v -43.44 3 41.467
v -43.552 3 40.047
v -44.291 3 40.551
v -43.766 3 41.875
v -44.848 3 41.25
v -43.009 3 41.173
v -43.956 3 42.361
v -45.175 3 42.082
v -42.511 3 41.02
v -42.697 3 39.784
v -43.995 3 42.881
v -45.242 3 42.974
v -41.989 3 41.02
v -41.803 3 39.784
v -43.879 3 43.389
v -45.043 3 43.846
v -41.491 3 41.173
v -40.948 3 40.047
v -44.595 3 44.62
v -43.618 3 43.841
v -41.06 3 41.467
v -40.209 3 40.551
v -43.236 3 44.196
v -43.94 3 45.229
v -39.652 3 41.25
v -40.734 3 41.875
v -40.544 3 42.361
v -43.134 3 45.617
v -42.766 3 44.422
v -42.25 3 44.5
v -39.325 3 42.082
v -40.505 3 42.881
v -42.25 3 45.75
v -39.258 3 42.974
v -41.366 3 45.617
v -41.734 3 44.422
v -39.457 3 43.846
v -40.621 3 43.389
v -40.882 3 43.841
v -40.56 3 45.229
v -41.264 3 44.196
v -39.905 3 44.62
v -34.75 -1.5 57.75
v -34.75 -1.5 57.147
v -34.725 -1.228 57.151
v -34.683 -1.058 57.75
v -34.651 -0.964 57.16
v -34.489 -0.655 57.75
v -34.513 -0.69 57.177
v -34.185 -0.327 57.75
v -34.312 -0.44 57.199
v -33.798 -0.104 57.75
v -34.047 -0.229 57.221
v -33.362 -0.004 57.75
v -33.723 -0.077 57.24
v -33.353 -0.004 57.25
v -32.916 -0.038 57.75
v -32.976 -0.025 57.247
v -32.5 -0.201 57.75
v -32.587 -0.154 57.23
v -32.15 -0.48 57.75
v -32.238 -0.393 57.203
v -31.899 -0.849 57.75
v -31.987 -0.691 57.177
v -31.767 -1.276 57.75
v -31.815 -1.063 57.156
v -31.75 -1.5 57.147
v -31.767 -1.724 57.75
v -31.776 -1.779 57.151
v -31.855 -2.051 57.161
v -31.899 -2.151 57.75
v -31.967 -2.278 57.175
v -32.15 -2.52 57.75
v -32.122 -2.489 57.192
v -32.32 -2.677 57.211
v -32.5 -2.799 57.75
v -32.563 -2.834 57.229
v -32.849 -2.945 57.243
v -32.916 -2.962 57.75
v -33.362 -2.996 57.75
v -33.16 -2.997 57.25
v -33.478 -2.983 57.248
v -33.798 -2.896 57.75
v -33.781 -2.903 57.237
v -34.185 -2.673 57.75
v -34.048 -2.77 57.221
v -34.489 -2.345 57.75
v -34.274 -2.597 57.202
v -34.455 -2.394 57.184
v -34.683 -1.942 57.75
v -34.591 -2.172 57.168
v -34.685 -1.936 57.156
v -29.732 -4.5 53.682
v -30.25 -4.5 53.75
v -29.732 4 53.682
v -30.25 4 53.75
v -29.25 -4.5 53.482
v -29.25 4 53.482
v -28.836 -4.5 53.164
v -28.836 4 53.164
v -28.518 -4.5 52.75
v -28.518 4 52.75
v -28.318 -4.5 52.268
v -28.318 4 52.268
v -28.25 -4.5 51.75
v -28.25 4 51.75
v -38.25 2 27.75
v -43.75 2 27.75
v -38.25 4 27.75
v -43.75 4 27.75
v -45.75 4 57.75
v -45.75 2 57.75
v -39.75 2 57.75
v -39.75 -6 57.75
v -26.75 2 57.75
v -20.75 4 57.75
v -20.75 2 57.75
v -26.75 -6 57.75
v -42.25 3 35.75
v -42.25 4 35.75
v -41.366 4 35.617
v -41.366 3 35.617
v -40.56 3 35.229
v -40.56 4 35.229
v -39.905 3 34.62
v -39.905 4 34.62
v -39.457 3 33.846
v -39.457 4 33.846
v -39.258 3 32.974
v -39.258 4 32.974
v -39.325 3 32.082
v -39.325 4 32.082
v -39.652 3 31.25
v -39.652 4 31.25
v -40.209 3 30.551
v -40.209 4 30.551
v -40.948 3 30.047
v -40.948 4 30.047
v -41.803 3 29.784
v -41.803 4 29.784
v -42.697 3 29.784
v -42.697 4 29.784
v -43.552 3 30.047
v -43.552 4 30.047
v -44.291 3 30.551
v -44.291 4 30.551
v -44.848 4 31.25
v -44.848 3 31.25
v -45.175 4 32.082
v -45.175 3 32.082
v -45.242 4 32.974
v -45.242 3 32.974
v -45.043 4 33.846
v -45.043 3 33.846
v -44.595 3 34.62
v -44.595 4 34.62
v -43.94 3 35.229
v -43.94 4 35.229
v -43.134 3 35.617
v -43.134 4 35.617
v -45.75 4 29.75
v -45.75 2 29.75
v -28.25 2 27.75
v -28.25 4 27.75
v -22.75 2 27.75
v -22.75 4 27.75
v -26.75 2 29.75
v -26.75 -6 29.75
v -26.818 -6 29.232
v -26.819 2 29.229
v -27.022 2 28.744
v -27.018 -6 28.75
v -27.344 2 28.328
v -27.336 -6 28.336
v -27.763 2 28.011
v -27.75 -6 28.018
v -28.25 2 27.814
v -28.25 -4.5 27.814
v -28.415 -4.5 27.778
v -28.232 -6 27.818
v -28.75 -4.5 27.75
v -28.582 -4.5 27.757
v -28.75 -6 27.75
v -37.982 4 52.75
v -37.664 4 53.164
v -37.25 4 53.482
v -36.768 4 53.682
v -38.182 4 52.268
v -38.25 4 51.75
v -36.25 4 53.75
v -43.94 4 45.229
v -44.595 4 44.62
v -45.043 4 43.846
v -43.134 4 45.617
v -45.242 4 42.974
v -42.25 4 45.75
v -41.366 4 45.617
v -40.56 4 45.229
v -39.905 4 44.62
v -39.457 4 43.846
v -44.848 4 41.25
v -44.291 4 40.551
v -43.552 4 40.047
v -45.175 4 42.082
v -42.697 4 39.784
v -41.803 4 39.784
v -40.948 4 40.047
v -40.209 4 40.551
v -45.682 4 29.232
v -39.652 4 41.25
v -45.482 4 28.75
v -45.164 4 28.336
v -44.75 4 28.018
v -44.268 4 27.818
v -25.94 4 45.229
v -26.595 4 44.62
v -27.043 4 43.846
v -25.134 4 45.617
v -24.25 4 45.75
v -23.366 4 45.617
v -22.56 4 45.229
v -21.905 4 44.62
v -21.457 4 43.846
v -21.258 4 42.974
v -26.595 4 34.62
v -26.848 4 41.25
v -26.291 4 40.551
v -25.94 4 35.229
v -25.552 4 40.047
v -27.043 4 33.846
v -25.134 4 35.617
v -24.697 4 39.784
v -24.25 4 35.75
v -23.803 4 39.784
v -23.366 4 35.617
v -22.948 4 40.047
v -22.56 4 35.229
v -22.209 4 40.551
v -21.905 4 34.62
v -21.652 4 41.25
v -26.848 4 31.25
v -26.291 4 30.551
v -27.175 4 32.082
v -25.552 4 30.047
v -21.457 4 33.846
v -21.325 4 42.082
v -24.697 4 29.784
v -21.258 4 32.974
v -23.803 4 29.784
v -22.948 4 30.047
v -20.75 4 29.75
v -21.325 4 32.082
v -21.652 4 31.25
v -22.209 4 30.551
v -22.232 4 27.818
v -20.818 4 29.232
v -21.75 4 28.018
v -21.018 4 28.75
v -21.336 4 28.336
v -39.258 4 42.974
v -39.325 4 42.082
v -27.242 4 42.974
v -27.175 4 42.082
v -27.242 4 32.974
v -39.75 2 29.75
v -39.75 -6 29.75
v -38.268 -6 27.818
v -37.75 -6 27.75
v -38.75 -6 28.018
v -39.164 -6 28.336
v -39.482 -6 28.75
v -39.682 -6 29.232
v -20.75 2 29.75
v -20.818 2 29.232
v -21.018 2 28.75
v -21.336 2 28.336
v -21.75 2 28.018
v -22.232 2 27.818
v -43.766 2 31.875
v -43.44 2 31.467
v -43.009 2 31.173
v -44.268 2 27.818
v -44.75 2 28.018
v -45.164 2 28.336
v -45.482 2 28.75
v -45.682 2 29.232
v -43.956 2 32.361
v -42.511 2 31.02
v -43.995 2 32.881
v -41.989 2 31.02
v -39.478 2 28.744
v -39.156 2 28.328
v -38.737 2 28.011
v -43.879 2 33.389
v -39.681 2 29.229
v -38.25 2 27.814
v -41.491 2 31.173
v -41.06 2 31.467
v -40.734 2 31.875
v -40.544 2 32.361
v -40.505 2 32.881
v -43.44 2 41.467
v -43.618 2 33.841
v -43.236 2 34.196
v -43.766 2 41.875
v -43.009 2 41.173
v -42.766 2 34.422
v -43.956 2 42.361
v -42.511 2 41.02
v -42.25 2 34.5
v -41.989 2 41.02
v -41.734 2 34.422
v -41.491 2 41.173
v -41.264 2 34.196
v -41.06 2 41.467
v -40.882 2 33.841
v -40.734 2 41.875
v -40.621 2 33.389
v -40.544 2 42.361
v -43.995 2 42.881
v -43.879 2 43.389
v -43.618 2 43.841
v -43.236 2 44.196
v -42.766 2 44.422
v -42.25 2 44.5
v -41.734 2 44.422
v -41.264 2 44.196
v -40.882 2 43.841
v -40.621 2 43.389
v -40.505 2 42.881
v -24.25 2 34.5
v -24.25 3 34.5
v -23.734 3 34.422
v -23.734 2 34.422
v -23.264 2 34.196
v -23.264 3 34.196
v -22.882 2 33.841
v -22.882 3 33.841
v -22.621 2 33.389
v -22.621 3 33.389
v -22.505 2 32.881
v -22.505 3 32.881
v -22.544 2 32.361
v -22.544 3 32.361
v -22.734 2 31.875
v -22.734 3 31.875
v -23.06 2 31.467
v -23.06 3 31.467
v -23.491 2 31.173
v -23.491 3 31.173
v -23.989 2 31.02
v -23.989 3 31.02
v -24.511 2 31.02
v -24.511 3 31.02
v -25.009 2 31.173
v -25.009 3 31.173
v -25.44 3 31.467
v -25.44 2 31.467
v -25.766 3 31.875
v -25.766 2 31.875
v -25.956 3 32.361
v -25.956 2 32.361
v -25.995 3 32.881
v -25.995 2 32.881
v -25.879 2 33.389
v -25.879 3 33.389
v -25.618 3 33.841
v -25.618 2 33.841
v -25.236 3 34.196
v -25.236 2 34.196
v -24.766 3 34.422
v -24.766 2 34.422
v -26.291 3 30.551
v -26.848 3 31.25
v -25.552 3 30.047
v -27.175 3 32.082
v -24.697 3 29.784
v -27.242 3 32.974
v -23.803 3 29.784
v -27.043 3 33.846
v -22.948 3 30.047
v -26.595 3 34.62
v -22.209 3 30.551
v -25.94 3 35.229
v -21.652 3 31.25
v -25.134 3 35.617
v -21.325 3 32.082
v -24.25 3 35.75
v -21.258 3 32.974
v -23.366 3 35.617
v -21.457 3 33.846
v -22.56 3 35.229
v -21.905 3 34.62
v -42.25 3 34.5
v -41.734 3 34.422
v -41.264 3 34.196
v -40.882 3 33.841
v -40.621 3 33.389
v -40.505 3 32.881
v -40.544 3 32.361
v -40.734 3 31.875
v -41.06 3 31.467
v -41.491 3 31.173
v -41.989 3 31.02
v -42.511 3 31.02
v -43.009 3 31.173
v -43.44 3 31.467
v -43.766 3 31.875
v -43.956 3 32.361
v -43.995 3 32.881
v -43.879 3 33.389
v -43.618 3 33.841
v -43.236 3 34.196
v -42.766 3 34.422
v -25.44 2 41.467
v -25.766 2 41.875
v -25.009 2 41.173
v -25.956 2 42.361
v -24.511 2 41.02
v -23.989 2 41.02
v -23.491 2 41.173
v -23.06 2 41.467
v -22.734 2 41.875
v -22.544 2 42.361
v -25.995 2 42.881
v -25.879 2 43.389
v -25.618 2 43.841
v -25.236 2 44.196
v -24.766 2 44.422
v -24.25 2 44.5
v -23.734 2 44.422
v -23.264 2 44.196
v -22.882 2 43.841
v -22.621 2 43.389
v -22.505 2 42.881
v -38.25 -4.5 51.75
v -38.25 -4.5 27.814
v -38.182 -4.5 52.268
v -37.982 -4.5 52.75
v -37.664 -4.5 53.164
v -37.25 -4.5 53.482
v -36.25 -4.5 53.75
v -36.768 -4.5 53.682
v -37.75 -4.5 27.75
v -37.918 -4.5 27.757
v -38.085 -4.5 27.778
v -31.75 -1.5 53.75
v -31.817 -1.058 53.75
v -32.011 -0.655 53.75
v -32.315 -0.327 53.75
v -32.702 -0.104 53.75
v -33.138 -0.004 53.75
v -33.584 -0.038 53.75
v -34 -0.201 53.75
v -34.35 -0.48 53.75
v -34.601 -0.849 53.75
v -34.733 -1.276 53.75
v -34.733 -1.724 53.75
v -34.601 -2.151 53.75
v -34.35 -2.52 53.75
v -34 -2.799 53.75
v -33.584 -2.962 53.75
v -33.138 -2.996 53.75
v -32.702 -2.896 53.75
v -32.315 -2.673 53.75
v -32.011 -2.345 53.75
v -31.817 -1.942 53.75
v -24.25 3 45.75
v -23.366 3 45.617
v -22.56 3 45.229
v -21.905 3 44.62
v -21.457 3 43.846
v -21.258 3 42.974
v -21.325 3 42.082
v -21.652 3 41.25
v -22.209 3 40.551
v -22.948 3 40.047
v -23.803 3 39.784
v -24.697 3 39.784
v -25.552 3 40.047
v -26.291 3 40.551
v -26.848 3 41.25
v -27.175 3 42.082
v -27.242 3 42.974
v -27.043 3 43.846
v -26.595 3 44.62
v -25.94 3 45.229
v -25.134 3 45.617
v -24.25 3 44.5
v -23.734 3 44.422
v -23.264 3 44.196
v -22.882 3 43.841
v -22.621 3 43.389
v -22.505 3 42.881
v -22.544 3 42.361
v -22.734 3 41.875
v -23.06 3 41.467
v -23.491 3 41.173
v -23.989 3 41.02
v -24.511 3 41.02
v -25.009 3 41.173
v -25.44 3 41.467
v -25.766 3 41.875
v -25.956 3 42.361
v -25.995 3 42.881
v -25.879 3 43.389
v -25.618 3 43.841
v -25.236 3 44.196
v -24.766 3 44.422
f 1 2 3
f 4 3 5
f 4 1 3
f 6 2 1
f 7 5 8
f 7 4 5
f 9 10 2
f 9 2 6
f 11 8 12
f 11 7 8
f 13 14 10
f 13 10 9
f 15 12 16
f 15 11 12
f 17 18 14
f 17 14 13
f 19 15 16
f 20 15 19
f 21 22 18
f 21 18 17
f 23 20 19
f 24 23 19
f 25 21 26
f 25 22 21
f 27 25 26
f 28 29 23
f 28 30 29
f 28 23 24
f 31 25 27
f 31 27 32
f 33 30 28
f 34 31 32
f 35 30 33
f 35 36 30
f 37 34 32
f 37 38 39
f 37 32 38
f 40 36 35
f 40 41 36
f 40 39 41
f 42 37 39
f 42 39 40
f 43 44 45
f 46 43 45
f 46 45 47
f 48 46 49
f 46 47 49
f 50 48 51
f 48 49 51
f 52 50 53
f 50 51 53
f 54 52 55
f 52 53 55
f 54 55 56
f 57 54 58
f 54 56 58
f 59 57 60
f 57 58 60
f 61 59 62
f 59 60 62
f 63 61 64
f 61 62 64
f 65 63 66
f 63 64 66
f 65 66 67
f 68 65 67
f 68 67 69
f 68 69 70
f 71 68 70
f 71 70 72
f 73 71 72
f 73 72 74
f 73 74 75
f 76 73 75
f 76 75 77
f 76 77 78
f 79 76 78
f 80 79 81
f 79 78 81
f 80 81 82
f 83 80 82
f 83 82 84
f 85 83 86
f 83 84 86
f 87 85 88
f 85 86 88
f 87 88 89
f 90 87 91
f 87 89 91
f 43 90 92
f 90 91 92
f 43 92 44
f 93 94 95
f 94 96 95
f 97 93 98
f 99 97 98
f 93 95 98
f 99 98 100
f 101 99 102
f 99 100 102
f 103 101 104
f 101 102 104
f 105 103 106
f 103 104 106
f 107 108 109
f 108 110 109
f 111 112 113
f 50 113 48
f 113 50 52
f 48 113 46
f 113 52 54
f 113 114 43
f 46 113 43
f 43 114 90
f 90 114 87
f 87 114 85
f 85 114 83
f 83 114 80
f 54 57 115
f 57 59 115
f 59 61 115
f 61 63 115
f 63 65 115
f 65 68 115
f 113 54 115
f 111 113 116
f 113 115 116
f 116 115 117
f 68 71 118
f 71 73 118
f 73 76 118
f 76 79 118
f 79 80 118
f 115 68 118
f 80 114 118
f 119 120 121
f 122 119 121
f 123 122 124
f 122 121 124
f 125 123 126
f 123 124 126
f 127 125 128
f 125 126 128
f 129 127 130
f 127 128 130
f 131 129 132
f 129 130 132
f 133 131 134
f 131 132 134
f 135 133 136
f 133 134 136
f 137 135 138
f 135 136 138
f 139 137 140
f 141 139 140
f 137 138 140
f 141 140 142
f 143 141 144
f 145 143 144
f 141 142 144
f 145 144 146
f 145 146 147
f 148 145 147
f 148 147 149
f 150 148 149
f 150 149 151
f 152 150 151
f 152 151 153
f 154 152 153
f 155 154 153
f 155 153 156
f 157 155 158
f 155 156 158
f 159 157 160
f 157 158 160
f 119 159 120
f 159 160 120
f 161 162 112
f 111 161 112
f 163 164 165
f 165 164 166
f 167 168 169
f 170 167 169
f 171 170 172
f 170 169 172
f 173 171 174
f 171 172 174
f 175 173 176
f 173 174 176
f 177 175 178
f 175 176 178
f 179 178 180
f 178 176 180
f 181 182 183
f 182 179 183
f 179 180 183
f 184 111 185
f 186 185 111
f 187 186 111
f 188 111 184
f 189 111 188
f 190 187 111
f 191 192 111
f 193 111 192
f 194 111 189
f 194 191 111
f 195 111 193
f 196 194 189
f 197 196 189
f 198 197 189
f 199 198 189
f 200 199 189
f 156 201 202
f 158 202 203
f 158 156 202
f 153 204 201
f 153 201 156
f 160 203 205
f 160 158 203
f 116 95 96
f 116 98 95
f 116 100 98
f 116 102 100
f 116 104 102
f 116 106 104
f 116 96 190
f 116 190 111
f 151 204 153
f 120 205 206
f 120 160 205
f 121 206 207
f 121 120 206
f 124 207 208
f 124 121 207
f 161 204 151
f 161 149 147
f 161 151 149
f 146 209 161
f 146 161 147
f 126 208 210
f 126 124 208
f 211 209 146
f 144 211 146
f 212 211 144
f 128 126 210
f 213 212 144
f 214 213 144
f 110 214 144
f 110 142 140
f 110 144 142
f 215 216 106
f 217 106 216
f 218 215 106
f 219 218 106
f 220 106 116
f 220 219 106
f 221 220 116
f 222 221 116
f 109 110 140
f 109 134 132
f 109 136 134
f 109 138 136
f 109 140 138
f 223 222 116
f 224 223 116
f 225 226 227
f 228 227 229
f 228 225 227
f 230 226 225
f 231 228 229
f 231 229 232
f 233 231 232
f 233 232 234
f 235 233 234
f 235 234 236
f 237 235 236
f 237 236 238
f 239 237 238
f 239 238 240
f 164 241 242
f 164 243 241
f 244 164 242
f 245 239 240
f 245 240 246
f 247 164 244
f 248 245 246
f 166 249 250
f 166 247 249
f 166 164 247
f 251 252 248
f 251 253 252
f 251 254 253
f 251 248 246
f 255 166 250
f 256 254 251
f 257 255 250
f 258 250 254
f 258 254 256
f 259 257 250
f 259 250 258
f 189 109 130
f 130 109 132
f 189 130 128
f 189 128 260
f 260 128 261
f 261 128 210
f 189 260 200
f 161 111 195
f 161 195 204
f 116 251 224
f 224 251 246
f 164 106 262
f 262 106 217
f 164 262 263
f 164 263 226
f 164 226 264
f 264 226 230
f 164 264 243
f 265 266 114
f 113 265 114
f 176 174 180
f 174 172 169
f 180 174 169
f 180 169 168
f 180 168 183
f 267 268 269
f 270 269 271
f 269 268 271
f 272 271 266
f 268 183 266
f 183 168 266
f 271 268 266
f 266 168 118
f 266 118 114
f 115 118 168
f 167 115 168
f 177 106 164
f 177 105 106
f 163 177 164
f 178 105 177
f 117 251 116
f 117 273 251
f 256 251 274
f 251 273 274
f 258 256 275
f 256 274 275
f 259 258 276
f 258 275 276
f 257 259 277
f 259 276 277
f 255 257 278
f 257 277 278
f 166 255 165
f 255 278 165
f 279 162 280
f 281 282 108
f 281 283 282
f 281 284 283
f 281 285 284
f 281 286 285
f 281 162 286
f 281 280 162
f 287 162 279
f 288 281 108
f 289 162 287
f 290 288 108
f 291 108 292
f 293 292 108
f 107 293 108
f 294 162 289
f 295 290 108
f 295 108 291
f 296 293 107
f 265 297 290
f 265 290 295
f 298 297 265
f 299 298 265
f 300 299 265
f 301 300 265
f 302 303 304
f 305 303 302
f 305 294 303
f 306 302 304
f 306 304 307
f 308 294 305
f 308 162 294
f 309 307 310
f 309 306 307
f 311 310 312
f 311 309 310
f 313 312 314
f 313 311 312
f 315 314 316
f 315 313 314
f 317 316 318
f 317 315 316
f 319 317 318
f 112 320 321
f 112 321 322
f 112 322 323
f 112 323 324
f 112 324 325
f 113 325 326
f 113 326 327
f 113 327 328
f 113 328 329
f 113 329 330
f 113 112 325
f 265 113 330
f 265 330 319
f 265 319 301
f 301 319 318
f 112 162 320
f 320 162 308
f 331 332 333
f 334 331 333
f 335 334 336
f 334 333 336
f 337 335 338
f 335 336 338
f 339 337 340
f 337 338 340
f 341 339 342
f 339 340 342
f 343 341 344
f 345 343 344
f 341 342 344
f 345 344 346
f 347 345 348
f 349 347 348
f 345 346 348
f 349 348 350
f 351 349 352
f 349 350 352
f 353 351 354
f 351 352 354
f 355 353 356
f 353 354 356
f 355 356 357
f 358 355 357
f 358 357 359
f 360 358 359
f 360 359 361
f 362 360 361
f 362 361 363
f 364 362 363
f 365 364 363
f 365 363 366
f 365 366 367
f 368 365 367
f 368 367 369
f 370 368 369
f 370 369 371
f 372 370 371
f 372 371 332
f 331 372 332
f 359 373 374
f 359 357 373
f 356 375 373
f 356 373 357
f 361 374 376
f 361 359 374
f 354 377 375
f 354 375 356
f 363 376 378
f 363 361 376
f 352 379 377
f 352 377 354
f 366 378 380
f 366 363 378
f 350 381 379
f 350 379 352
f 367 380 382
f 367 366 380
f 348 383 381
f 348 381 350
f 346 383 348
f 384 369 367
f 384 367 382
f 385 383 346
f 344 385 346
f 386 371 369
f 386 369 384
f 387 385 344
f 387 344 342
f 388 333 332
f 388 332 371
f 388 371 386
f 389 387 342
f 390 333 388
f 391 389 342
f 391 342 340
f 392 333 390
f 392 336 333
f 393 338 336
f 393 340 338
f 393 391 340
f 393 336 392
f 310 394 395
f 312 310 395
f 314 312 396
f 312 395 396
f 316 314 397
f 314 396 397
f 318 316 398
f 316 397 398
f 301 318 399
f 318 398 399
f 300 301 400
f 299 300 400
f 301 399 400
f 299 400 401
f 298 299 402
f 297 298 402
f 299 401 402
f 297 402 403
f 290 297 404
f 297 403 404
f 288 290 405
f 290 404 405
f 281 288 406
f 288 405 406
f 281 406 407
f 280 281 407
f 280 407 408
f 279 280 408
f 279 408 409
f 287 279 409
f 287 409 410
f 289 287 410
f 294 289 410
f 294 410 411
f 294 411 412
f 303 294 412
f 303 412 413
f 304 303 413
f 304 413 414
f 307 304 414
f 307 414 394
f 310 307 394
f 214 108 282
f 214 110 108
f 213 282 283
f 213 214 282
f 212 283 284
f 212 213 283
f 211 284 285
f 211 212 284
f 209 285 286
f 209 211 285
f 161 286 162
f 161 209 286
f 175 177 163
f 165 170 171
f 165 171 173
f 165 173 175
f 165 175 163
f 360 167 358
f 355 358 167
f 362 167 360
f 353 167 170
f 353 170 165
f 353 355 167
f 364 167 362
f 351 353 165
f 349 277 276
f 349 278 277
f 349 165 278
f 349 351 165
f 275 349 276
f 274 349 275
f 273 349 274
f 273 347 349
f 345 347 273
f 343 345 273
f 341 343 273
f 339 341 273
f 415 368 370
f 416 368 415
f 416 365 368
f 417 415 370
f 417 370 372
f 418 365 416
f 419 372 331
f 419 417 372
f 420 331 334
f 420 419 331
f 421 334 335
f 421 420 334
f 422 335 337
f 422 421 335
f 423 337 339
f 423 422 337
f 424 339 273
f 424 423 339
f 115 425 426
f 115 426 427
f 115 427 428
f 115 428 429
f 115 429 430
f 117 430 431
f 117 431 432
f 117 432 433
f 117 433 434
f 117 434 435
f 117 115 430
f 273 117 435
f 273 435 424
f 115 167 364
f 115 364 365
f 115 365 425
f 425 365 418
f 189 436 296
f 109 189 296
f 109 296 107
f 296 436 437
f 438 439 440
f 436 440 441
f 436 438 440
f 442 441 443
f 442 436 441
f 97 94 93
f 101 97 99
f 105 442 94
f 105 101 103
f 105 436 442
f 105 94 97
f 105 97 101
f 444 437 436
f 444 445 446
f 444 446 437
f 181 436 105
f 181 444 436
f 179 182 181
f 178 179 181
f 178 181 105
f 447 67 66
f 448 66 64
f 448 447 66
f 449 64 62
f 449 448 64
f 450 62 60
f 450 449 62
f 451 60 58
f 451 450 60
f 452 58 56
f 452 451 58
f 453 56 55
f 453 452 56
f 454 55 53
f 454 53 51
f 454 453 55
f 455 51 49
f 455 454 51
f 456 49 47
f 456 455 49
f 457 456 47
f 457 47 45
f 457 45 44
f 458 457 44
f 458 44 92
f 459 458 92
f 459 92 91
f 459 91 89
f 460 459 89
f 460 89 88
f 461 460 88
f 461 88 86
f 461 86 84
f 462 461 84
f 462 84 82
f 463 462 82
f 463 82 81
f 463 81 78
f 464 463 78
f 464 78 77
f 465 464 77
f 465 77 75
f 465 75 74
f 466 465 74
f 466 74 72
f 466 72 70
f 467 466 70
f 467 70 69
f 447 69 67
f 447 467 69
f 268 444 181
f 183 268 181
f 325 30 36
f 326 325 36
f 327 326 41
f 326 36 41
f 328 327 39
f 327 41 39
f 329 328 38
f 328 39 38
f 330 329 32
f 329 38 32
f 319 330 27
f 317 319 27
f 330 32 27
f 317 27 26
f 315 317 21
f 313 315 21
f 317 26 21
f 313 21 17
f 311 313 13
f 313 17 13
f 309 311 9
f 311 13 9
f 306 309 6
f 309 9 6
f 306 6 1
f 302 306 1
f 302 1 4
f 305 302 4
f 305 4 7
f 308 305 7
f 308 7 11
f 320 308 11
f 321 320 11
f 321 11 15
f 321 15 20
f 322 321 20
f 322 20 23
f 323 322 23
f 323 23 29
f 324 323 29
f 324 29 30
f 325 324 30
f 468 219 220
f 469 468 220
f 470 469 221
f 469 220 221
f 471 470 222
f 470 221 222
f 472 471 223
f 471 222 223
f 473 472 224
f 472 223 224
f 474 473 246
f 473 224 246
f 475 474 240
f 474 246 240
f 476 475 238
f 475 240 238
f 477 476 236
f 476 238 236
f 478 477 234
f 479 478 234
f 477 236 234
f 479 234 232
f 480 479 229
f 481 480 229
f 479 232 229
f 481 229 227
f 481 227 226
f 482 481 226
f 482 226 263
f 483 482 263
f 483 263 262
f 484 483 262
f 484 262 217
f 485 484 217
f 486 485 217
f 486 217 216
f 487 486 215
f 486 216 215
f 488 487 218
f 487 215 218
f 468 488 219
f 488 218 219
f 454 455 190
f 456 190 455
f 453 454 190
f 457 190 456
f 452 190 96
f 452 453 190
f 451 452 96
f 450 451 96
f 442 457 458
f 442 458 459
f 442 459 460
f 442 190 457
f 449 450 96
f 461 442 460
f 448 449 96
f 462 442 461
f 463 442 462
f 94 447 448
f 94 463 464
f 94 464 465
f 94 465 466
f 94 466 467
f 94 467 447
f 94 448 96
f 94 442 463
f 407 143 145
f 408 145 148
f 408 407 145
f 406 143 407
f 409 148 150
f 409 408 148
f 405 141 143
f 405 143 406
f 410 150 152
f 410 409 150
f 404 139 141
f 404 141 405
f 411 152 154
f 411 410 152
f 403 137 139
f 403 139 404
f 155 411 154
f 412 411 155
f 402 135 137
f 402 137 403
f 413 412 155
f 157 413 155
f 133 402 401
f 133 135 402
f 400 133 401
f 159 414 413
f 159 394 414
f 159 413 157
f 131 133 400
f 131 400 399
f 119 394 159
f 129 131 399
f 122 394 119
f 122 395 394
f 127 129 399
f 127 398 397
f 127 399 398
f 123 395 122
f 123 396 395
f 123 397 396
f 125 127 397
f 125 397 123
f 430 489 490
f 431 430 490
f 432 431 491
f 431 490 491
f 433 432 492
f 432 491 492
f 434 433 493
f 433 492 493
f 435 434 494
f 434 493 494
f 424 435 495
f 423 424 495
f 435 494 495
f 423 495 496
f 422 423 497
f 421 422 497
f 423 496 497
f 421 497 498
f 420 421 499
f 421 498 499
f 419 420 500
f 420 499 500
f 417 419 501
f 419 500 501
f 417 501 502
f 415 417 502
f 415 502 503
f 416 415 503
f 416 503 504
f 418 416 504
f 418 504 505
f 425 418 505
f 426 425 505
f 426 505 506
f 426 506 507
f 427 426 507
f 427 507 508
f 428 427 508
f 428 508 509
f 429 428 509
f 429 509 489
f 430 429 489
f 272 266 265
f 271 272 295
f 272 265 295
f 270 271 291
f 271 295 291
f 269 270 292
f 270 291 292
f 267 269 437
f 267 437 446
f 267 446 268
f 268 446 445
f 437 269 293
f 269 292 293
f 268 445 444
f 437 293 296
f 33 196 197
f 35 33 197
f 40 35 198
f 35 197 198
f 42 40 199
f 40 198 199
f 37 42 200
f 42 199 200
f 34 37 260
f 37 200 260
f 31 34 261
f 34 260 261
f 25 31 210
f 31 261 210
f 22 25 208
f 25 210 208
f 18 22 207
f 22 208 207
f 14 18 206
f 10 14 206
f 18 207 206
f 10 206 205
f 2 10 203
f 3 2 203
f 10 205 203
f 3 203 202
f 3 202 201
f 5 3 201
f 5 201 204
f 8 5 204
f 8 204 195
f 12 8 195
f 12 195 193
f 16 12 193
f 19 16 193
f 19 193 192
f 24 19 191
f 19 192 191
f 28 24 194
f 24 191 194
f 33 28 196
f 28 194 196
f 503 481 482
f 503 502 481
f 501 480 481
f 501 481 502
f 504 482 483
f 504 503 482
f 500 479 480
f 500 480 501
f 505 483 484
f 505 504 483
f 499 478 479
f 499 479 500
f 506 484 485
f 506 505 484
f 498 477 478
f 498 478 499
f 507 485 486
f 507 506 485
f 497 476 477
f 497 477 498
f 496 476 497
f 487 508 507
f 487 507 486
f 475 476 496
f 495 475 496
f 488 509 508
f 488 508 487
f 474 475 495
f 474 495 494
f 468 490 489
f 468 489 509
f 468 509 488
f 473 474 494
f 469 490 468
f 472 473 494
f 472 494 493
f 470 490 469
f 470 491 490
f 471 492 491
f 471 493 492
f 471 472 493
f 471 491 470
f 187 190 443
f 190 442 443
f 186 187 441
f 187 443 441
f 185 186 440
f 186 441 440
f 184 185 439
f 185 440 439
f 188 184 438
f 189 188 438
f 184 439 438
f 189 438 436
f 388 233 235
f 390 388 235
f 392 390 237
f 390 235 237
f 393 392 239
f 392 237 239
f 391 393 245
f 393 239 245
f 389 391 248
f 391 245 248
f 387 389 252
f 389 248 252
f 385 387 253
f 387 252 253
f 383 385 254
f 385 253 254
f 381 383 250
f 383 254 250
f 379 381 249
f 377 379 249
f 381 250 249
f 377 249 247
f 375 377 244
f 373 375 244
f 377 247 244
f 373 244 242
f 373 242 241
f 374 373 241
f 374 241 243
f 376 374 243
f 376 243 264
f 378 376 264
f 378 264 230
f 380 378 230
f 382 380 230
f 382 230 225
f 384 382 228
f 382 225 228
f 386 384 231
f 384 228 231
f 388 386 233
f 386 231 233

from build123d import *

# Parameters (mm, degrees)
SKETCH_1_W           = 35
SKETCH_1_H           = 55
EXTRUDE_1_DEPTH      = 1
EXTRUDE_2_DEPTH      = 3
SKETCH_3_R           = 5
CUT_EXTRUDE_1_DEPTH  = 169.569903897
SKETCH_4_R           = 4
CUT_EXTRUDE_2_DEPTH  = 2
SKETCH_5_R           = 2
CUT_EXTRUDE_3_DEPTH  = 2
EXTRUDE_START        = 7
EXTRUDE_3_DEPTH      = 7
CUT_EXTRUDE_START    = -1.5
SKETCH_9_W           = 10
SKETCH_9_H           = 26
CUT_EXTRUDE_4_DEPTH  = 168.318874833
SKETCH_10_R          = 1.5
CUT_EXTRUDE_5_DEPTH  = 194.595583627
SKETCH_11_W          = 338.377402865
SKETCH_11_H          = 318.232792562
CUT_EXTRUDE_6_DEPTH  = 10
SKETCH_12_W          = 33.023791835
SKETCH_12_H          = 7.5
CUT_EXTRUDE_7_DEPTH  = 74.963673636
CUT_EXTRUDE_START_2  = 9
CUT_EXTRUDE_8_DEPTH  = 10
EXTRUDE_START_2      = -2
EXTRUDE_4_DEPTH      = 2
EXTRUDE_5_DEPTH      = 8
SKETCH_16_R          = 1.5
CUT_EXTRUDE_9_DEPTH  = 53.962840747
SKETCH_17_R          = 1.75
CUT_EXTRUDE_10_DEPTH = 10
SKETCH_18_R          = 3
CUT_EXTRUDE_11_DEPTH = 1
FILLET_1_R           = 2
FILLET_2_R           = 2
FILLET_3_R           = 2
FILLET_4_R           = 2


with BuildPart() as part:
    # 草图1 → 凸台-拉伸1 (new body)
    with BuildSketch(Plane(origin=(0, 0, 0), x_dir=(1, 0, 0), z_dir=(0, 1, 0))):
        Rectangle(SKETCH_1_W, SKETCH_1_H)
    extrude(amount=EXTRUDE_1_DEPTH)

    # 草图2 → 凸台-拉伸2 (add)
    with BuildSketch(Plane(origin=(0, 1, 0), x_dir=(1, 0, 0), z_dir=(0, 1, 0))):
        with BuildLine():
            Line((106.75, -2.25), (106.75, 2.25))
            Line((106.75, 2.25), (121.75, 2.25))
            ThreePointArc((121.75, 2.25), (122.922125199, 2.352547667), (124.058635967, 2.65707481))
            Line((124.058635967, 2.65707481), (154.058635967, 13.576181838))
            ThreePointArc((154.058635967, 13.576181838), (158.397452333, 21.091232227), (151.75, 26.669107028))
            Line((151.75, 26.669107028), (-31.447415548, 57.101298968))
            ThreePointArc((-31.447415548, 57.101298968), (-37.800418235, 56.264673928), (-42.609265279, 52.029632639))
            Line((-42.609265279, 52.029632639), (-60.161792173, 23.605896086))
            ThreePointArc((-60.161792173, 23.605896086), (-61.717833724, 20.073278016), (-62.25, 16.25))
            Line((-62.25, 16.25), (-62.25, -16.25))
            ThreePointArc((-62.25, -16.25), (-61.717833724, -20.073278016), (-60.161792173, -23.605896086))
            Line((-60.161792173, -23.605896086), (-42.609265279, -52.029632639))
            ThreePointArc((-42.609265279, -52.029632639), (-37.800418235, -56.264673928), (-31.447415548, -57.101298968))
            Line((-31.447415548, -57.101298968), (151.75, -26.669107028))
            ThreePointArc((151.75, -26.669107028), (158.397452333, -21.091232227), (154.058635967, -13.576181838))
            Line((154.058635967, -13.576181838), (124.058635967, -2.65707481))
            ThreePointArc((124.058635967, -2.65707481), (122.922125199, -2.352547667), (121.75, -2.25))
            Line((121.75, -2.25), (106.75, -2.25))
        make_face()
    extrude(amount=EXTRUDE_2_DEPTH)

    # 草图3 → 切除-拉伸1 (cut, through all)
    with BuildSketch(Plane(origin=(0, 4, 0), x_dir=(1, 0, 0), z_dir=(0, 1, 0))):
        with Locations(Location((-48.25, 16.25, 0), (0, 0, 270))):
            Circle(SKETCH_3_R)
        with Locations(Location((-48.25, -16.25, 0), (0, 0, 270))):
            Circle(SKETCH_3_R)
    extrude(amount=-CUT_EXTRUDE_1_DEPTH, mode=Mode.SUBTRACT)

    # 草图4 → 切除-拉伸2 (cut)
    with BuildSketch(Plane(origin=(0, 4, 0), x_dir=(1, 0, 0), z_dir=(0, 1, 0))):
        with Locations(Location((-33.25, 46.25, 0), (0, 0, 270))):
            Circle(SKETCH_4_R)
        with Locations(Location((-33.25, -46.25, 0), (0, 0, 270))):
            Circle(SKETCH_4_R)
    extrude(amount=-CUT_EXTRUDE_2_DEPTH, mode=Mode.SUBTRACT)

    # 草图5 → 切除-拉伸3 (cut)
    with BuildSketch(Plane(origin=(0, 4, 0), x_dir=(1, 0, 0), z_dir=(0, 1, 0))):
        with Locations(Location((121.75, 9, 0), (0, 0, 270))):
            Circle(SKETCH_5_R)
        with Locations(Location((121.75, -9, 0), (0, 0, 270))):
            Circle(SKETCH_5_R)
        with Locations(Location((151.75, 19.919107028, 0), (0, 0, 270))):
            Circle(SKETCH_5_R)
        with Locations(Location((151.75, -19.919107028, 0), (0, 0, 270))):
            Circle(SKETCH_5_R)
    extrude(amount=-CUT_EXTRUDE_3_DEPTH, mode=Mode.SUBTRACT)

    # 草图8 → 凸台-拉伸3 (add)
    with BuildSketch(Plane.XZ.offset(-1).offset(EXTRUDE_START)):
        with BuildLine():
            Line((-26.75, -26.25), (-39.75, -26.25))
            Line((-39.75, -26.25), (-39.75, -55.124119675))
            ThreePointArc((-39.75, -55.124119675), (-35.798281322, -56.950759894), (-31.447415548, -57.101298968))
            Line((-31.447415548, -57.101298968), (-26.75, -56.320978726))
            Line((-26.75, -56.320978726), (-26.75, -26.25))
        make_face()
    extrude_3 = extrude(amount=-EXTRUDE_3_DEPTH)

    # 镜向1: 凸台-拉伸3 across plane
    add(extrude_3.mirror(Plane.XY))

    # 草图9 → 切除-拉伸4 (cut, through all)
    with BuildSketch(Plane.XZ.offset(6).offset(CUT_EXTRUDE_START)):
        with Locations((-33.25, -40.75)):
            Rectangle(SKETCH_9_W, SKETCH_9_H)
    cut_extrude_4 = extrude(amount=-CUT_EXTRUDE_4_DEPTH, mode=Mode.SUBTRACT)

    # 镜向2: 切除-拉伸4 across plane
    add(cut_extrude_4.mirror(Plane.XY), mode=Mode.SUBTRACT)

    # 草图10 → 切除-拉伸5 (cut, through all)
    with BuildSketch(Plane.XY.offset(-53.75)):
        with Locations((-33.25, -1.5)):
            Circle(SKETCH_10_R)
    cut_extrude_5 = extrude(amount=-CUT_EXTRUDE_5_DEPTH, mode=Mode.SUBTRACT)

    # 镜向3: 切除-拉伸5 across plane
    add(cut_extrude_5.mirror(Plane.XY), mode=Mode.SUBTRACT)

    # 草图11 → 切除-拉伸6 (cut)
    with BuildSketch(Plane.XZ.offset(6)):
        with Locations((33.683140033, 0)):
            Rectangle(SKETCH_11_W, SKETCH_11_H)
        with BuildLine():
            ThreePointArc((-30.464187664, 63.020189314), (-38.770685795, 62.328620225), (-45.75, 57.771718622))
            Line((-45.75, 57.771718622), (-45.75, 20.25))
            Line((-45.75, 20.25), (-20.75, 20.25))
            Line((-20.75, 20.25), (-20.75, 61.406498299))
            Line((-20.75, 61.406498299), (-30.464187664, 63.020189314))
        make_face(mode=Mode.SUBTRACT)
    extrude(amount=-CUT_EXTRUDE_6_DEPTH, mode=Mode.SUBTRACT)

    # 草图12 → 切除-拉伸7 (cut, through all)
    with BuildSketch(Plane(origin=(0, 4, 0), x_dir=(1, 0, 0), z_dir=(0, 1, 0))):
        with Locations((-37.261895917, -24)):
            Rectangle(SKETCH_12_W, SKETCH_12_H)
    extrude(amount=-CUT_EXTRUDE_7_DEPTH, mode=Mode.SUBTRACT)

    # 草图13 → 切除-拉伸8 (cut)
    with BuildSketch(Plane.XZ.offset(-1).offset(CUT_EXTRUDE_START_2)):
        Polygon((-26.75, 56.320978726), (-26.75, 27.75), (-20.75, 27.75), (-20.75, 55.324277157), align=None)
        with BuildLine():
            Line((-45.75, 46.943674541), (-45.75, 27.75))
            Line((-45.75, 27.75), (-39.75, 27.75))
            Line((-39.75, 27.75), (-39.75, 55.124119675))
            ThreePointArc((-39.75, 55.124119675), (-41.329172996, 53.715049478), (-42.609265279, 52.029632639))
            Line((-42.609265279, 52.029632639), (-45.75, 46.943674541))
        make_face()
    extrude(amount=-CUT_EXTRUDE_8_DEPTH, mode=Mode.SUBTRACT)

    # 草图14 → 凸台-拉伸4 (add)
    with BuildSketch(Plane(origin=(0, 4, 0), x_dir=(1, 0, 0), z_dir=(0, 1, 0)).offset(EXTRUDE_START_2)):
        with BuildLine():
            Line((-38.25, -53.75), (-38.25, -27.75))
            Line((-38.25, -27.75), (-45.75, -27.75))
            Line((-45.75, -27.75), (-45.75, -46.943674541))
            Line((-45.75, -46.943674541), (-42.609265279, -52.029632639))
            ThreePointArc((-42.609265279, -52.029632639), (-37.800418235, -56.264673928), (-31.447415548, -57.101298968))
            Line((-31.447415548, -57.101298968), (-20.75, -55.324277157))
            Line((-20.75, -55.324277157), (-20.75, -27.75))
            Line((-20.75, -27.75), (-28.25, -27.75))
            Line((-28.25, -27.75), (-28.25, -53.75))
            Line((-28.25, -53.75), (-38.25, -53.75))
        make_face()
        with BuildLine():
            Line((-20.75, -57.75), (-20.75, -55.324277157))
            Line((-20.75, -55.324277157), (-31.447415548, -57.101298968))
            ThreePointArc((-31.447415548, -57.101298968), (-37.800418235, -56.264673928), (-42.609265279, -52.029632639))
            Line((-42.609265279, -52.029632639), (-45.75, -46.943674541))
            Line((-45.75, -46.943674541), (-45.75, -57.75))
            Line((-45.75, -57.75), (-20.75, -57.75))
        make_face()
    extrude(amount=EXTRUDE_4_DEPTH)

    # 草图15 → 凸台-拉伸5 (add)
    with BuildSketch(Plane.XZ.offset(6)):
        with BuildLine():
            Line((-39.75, 55.124119675), (-39.75, 57.75))
            Line((-39.75, 57.75), (-26.75, 57.75))
            Line((-26.75, 57.75), (-26.75, 56.320978726))
            Line((-26.75, 56.320978726), (-31.447415548, 57.101298968))
            ThreePointArc((-31.447415548, 57.101298968), (-35.798281322, 56.950759894), (-39.75, 55.124119675))
        make_face()
    extrude(amount=-EXTRUDE_5_DEPTH)

    # 草图16 → 切除-拉伸9 (cut, through all)
    with BuildSketch(Plane(origin=(0, 0, 53.75), x_dir=(-1, 0, 0), z_dir=(0, 0, -1))):
        with Locations((33.25, -1.5)):
            Circle(SKETCH_16_R)
    extrude(amount=-CUT_EXTRUDE_9_DEPTH, mode=Mode.SUBTRACT)

    # 草图17 → 切除-拉伸10 (cut)
    with BuildSketch(Plane(origin=(0, 4, 0), x_dir=(1, 0, 0), z_dir=(0, 1, 0))):
        with Locations(Location((-24.25, -32.75, 0), (0, 0, 270))):
            Circle(SKETCH_17_R)
        with Locations(Location((-24.25, -42.75, 0), (0, 0, 270))):
            Circle(SKETCH_17_R)
        with Locations(Location((-42.25, -42.75, 0), (0, 0, 270))):
            Circle(SKETCH_17_R)
        with Locations(Location((-42.25, -32.75, 0), (0, 0, 270))):
            Circle(SKETCH_17_R)
    extrude(amount=-CUT_EXTRUDE_10_DEPTH, mode=Mode.SUBTRACT)

    # 草图18 → 切除-拉伸11 (cut)
    with BuildSketch(Plane(origin=(0, 4, 0), x_dir=(1, 0, 0), z_dir=(0, 1, 0))):
        with Locations(Location((-42.25, -32.75, 0), (0, 0, 270))):
            Circle(SKETCH_18_R)
        with Locations(Location((-24.25, -32.75, 0), (0, 0, 270))):
            Circle(SKETCH_18_R)
        with Locations(Location((-24.25, -42.75, 0), (0, 0, 270))):
            Circle(SKETCH_18_R)
        with Locations(Location((-42.25, -42.75, 0), (0, 0, 270))):
            Circle(SKETCH_18_R)
    extrude(amount=-CUT_EXTRUDE_11_DEPTH, mode=Mode.SUBTRACT)

    # 圆角1
    # the kernel refuses this fillet: 2 mm, written as the material it takes off along each edge
    with BuildSketch(Plane(origin=(-39.75, 2, 27.75), x_dir=(1, 0, 0), z_dir=(0, -1, 0))) as fillet_1_piece_1:
        with BuildLine():
            CenterArc((FILLET_1_R, FILLET_1_R), FILLET_1_R, 180, 90)
            Line((0, FILLET_1_R), (0, 0))
            Line((0, 0), (FILLET_1_R, 0))
        make_face()
    extrude(amount=13, mode=Mode.SUBTRACT)

    # 圆角2
    fillet_2_edges = [part.edges().sort_by_distance(p)[0] for p in [
        (-45.75, 3, 27.75),
        (-20.75, 3, 27.75),
    ]]
    fillet(fillet_2_edges, radius=FILLET_2_R)

    # 圆角3
    # the kernel refuses this fillet: 2 mm, written as the material it takes off along each edge
    with BuildSketch(Plane(origin=(-26.75, -11, 27.75), x_dir=(-1, 0, 0), z_dir=(0, 1, 0))) as fillet_3_piece_1:
        with BuildLine():
            CenterArc((FILLET_3_R, FILLET_3_R), FILLET_3_R, 180, 90)
            Line((0, FILLET_3_R), (0, 0))
            Line((0, 0), (FILLET_3_R, 0))
        make_face()
    extrude(amount=13, mode=Mode.SUBTRACT)

    # 圆角4
    fillet_4_edges = [part.edges().sort_by_distance(p)[0] for p in [
        (-28.25, -0.25, 53.75),
        (-38.25, -0.25, 53.75),
    ]]
    fillet(fillet_4_edges, radius=FILLET_4_R)


solid = part.part
